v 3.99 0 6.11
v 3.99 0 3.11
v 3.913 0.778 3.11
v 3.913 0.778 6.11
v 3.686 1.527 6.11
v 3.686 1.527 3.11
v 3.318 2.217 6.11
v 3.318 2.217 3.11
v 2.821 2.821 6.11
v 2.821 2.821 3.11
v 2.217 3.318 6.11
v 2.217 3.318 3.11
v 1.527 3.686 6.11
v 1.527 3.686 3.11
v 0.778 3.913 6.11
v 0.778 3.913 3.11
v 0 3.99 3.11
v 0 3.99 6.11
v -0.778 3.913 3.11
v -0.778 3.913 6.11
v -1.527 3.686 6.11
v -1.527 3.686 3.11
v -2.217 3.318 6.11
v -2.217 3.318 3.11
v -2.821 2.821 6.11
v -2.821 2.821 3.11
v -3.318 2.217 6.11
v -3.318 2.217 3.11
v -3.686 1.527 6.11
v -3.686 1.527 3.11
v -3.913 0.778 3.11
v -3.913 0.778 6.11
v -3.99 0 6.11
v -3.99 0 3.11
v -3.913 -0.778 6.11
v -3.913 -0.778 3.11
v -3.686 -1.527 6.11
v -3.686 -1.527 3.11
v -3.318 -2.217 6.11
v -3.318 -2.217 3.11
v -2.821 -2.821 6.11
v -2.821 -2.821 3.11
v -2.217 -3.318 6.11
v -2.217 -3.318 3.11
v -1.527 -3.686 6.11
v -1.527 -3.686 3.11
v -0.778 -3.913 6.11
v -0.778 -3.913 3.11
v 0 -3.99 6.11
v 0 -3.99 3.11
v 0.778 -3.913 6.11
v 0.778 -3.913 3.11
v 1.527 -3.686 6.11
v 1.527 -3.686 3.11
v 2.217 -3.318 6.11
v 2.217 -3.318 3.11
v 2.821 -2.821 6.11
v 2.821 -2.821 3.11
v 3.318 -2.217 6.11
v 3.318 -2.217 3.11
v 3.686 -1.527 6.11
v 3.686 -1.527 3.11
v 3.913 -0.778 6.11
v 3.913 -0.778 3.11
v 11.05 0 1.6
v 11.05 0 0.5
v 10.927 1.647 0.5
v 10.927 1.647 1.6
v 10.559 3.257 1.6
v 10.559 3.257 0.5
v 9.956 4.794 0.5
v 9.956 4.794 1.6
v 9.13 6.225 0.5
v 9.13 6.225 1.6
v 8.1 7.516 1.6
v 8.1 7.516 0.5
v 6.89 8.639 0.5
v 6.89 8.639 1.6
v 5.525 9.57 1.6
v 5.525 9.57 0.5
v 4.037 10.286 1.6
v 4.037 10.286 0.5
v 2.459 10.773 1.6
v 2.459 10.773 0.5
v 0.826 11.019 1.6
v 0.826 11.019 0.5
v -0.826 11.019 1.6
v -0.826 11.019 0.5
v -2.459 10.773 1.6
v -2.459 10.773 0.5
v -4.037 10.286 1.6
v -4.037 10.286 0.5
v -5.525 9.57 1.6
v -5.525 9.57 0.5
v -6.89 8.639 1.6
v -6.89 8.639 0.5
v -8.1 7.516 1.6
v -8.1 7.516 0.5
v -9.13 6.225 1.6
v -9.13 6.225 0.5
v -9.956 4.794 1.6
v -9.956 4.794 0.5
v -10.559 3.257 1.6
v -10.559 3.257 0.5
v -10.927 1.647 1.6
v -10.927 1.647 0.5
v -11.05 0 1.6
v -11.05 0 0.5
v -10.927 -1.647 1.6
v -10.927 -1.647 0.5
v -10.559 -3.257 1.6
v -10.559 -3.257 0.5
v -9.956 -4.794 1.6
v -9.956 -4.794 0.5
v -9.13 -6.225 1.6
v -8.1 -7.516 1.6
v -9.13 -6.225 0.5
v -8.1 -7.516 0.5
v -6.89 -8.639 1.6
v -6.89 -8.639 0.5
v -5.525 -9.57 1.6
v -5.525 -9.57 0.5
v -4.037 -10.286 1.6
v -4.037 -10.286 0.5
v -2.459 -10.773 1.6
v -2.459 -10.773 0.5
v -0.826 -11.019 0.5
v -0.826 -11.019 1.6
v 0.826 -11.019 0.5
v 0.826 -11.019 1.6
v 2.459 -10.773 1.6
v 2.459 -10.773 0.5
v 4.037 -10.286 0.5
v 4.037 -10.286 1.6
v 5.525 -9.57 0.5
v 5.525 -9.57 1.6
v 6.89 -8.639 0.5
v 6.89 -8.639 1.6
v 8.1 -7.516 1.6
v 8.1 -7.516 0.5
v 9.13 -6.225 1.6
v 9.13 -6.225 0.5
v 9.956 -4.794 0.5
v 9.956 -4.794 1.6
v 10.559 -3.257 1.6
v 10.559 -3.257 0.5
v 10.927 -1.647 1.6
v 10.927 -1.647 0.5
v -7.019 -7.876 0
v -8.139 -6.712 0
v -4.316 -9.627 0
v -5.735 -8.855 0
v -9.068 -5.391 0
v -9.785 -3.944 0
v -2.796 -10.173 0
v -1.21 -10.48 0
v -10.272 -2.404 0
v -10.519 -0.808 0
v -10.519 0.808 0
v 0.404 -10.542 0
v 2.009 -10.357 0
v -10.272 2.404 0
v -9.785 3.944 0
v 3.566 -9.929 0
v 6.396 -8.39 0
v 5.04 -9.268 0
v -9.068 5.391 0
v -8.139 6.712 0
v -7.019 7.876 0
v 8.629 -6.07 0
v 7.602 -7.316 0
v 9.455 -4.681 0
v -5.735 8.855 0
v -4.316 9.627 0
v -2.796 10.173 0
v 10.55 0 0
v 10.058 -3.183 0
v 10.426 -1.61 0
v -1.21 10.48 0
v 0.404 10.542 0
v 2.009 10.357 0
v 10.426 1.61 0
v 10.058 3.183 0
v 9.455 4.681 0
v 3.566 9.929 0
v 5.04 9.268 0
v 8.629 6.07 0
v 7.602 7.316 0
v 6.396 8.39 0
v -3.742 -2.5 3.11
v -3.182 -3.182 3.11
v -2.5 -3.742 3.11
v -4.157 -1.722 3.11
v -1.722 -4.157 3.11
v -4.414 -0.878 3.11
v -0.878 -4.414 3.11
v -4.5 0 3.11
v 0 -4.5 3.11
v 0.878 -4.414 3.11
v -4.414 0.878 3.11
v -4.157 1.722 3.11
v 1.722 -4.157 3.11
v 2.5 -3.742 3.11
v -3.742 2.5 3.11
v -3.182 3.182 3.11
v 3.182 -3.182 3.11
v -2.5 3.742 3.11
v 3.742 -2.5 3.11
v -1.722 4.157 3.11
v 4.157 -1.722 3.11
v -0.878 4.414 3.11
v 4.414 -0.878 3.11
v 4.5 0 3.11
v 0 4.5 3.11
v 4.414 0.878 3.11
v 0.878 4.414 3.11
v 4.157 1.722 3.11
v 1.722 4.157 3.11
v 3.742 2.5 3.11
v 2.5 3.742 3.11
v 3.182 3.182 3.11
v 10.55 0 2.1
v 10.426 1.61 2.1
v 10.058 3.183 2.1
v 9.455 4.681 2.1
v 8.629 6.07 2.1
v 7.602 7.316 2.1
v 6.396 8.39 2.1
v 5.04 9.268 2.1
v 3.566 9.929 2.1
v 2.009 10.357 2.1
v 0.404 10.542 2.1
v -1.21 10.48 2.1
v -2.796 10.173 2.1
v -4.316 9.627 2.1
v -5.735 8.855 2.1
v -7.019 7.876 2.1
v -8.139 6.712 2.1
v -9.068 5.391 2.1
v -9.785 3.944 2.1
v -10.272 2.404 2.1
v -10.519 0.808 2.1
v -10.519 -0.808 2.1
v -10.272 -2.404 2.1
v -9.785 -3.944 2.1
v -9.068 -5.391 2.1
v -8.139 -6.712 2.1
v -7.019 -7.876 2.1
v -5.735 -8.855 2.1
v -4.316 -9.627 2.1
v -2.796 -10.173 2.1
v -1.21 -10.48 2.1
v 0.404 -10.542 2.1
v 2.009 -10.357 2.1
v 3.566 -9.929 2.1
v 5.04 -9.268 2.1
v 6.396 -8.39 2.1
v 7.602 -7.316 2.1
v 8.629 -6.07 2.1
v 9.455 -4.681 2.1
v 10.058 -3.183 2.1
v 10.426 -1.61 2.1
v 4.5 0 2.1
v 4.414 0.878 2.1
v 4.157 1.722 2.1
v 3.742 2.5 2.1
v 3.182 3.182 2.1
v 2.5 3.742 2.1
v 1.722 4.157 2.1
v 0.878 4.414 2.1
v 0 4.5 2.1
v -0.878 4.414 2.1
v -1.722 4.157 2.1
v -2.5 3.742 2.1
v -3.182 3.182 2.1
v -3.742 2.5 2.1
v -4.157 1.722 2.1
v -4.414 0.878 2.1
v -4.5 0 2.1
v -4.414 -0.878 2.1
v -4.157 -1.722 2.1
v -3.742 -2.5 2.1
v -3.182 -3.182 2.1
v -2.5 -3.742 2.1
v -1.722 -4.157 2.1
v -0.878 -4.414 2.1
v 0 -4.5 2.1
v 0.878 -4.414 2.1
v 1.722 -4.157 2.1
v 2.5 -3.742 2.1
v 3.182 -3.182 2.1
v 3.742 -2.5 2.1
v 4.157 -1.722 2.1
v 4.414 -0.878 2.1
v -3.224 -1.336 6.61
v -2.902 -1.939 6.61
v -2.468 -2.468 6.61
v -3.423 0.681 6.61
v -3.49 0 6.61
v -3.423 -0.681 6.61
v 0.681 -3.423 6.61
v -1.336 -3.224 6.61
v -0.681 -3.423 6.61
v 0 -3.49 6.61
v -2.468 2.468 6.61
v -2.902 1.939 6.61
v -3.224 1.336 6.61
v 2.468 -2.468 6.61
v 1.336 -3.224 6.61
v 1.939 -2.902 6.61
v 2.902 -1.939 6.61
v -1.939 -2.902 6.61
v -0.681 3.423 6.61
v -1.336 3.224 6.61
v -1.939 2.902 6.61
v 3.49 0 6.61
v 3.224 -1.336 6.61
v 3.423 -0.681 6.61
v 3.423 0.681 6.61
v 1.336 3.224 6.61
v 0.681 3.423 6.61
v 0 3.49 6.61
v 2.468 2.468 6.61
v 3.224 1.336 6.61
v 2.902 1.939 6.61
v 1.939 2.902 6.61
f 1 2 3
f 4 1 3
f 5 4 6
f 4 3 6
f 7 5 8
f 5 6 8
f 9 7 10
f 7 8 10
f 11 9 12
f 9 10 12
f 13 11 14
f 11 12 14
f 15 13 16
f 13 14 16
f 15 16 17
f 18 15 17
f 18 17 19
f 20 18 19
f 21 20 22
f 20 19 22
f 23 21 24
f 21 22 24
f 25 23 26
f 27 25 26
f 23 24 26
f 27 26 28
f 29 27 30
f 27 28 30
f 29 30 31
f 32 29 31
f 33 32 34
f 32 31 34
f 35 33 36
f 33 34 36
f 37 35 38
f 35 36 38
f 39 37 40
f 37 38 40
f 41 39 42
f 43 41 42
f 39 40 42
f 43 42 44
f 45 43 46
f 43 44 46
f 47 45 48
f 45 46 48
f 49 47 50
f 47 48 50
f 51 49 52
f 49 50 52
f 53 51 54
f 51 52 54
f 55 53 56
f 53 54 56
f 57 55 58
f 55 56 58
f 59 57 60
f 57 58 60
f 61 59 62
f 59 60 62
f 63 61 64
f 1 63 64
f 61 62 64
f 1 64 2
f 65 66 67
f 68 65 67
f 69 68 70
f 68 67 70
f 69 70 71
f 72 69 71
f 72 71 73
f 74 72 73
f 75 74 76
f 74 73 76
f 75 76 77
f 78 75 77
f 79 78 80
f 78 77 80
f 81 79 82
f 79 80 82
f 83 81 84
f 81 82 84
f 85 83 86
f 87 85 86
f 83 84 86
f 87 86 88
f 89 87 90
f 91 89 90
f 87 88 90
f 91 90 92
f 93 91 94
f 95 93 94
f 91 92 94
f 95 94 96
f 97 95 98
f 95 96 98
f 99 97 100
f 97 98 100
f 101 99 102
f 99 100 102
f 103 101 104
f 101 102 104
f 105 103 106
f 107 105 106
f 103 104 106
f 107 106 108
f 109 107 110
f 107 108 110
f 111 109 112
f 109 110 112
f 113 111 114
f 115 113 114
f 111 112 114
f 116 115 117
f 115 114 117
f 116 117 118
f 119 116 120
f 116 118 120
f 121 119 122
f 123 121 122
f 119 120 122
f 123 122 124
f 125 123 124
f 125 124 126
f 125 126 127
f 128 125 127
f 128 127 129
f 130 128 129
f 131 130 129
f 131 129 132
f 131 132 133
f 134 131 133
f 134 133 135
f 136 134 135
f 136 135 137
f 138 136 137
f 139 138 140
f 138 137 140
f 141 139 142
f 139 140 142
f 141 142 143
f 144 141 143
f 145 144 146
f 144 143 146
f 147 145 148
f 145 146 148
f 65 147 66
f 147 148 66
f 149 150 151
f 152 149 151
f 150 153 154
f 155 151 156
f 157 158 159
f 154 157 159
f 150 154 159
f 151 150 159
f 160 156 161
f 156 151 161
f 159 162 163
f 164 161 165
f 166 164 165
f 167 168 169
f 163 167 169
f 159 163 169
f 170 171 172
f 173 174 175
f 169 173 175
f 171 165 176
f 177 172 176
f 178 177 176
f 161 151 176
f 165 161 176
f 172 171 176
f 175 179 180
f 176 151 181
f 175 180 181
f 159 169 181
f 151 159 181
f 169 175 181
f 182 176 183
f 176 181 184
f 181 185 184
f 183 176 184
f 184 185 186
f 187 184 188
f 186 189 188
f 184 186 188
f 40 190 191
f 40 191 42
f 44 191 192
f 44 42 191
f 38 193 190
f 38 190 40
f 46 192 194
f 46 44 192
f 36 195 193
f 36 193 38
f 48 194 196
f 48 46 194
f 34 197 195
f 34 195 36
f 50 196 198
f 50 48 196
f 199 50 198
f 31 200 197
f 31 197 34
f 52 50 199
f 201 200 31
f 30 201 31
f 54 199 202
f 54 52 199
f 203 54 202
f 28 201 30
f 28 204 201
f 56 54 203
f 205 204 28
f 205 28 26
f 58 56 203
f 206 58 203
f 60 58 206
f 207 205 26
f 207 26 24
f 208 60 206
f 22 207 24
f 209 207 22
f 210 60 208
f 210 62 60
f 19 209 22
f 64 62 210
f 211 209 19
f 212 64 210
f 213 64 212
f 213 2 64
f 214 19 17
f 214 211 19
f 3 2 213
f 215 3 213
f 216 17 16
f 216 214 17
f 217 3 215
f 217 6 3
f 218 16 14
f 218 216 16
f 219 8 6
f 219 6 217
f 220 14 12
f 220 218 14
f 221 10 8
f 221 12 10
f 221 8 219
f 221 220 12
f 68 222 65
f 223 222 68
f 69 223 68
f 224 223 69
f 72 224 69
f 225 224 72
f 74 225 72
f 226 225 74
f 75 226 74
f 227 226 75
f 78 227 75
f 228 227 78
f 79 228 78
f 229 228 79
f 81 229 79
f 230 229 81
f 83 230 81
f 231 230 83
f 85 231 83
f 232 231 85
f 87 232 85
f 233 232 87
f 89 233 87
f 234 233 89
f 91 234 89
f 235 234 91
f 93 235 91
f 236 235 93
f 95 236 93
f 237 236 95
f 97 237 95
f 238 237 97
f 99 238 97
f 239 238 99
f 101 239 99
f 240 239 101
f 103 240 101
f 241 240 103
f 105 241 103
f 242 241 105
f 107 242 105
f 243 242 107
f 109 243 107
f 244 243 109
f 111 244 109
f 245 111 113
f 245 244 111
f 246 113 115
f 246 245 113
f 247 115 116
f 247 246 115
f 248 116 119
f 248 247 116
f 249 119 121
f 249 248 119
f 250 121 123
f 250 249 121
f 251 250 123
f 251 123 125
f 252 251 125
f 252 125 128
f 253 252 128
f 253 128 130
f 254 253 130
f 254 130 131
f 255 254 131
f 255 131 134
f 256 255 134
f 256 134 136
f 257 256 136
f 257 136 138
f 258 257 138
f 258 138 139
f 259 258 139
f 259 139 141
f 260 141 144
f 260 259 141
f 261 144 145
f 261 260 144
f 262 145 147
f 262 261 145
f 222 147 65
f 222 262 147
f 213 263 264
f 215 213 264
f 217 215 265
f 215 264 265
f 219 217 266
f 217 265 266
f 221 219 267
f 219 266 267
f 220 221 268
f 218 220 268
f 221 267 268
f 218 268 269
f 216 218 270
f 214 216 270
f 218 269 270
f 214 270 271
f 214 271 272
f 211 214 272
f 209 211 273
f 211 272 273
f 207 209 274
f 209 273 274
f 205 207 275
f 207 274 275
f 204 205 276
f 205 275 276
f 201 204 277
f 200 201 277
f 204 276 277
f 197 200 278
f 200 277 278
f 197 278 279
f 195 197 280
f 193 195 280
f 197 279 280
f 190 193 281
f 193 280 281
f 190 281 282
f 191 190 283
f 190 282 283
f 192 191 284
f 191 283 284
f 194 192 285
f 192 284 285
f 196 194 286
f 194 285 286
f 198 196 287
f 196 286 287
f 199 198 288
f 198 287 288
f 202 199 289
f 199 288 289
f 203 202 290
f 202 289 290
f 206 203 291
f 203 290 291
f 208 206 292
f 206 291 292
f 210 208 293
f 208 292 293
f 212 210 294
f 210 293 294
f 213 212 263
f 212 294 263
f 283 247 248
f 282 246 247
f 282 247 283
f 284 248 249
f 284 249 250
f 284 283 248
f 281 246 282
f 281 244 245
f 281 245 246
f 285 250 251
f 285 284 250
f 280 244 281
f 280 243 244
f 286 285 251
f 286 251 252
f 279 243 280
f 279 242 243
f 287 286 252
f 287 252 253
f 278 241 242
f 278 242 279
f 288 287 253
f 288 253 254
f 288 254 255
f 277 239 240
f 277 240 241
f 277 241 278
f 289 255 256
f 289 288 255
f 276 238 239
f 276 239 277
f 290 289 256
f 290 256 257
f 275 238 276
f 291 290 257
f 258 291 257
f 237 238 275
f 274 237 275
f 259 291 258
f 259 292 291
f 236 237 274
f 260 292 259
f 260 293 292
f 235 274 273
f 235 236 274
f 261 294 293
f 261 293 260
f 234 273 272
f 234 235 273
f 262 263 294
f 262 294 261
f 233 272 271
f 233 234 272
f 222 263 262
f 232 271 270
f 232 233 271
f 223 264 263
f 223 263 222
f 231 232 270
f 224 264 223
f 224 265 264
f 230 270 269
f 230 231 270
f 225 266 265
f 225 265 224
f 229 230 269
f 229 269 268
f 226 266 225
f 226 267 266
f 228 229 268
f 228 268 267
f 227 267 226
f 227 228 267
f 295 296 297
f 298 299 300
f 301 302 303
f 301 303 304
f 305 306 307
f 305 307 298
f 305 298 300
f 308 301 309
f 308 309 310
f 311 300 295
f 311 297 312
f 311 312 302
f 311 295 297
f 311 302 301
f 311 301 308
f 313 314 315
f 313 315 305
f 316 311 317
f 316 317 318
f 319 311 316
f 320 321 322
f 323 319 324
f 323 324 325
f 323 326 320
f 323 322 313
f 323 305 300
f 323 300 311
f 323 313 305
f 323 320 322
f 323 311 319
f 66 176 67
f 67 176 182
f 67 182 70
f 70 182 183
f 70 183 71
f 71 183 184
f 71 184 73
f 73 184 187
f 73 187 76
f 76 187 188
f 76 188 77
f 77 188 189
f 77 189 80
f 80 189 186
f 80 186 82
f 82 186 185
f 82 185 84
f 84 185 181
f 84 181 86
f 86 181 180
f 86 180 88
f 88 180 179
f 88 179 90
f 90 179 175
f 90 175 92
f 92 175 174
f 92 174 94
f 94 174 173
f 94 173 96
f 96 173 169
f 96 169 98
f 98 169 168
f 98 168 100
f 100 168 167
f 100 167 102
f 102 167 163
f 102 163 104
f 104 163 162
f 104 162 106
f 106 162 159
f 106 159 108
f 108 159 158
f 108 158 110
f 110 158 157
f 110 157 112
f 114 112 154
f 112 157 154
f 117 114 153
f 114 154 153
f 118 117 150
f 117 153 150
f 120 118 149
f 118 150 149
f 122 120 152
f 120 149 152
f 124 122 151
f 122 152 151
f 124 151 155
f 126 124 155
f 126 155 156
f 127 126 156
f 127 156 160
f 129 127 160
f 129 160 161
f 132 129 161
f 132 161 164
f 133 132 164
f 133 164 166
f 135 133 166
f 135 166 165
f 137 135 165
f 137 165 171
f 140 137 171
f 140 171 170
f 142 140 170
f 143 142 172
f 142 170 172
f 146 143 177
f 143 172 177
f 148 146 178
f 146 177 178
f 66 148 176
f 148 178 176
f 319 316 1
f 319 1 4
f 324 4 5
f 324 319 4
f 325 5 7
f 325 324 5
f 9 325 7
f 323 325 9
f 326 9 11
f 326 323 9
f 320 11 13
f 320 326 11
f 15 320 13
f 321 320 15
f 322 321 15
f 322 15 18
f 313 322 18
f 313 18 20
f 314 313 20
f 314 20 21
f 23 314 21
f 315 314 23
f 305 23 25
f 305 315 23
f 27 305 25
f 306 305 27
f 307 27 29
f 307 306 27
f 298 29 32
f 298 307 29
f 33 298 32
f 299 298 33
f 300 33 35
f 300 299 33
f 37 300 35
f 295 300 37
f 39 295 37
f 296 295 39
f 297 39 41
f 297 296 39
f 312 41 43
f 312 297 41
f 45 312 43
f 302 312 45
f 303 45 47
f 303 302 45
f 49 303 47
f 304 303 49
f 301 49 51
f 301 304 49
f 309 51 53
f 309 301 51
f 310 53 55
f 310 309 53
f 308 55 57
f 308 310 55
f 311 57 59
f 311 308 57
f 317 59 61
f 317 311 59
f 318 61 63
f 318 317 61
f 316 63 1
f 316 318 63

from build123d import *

# Parameters (mm, degrees)
F0_R     = 11.05
F1_DEPTH = 2.1
F2_R     = 4.5
F3_DEPTH = 1.01
F4_R     = 3.99
F5_DEPTH = 3.5
F6_SIZE  = 0.5


with BuildPart() as f1:
    # F0 (on Top) → F1 (new body)
    with BuildSketch(Plane.XY):
        Circle(F0_R)
    extrude(amount=F1_DEPTH)

    # F2 (on face) → F3 (join)
    with BuildSketch(Plane.XY.offset(2.1)):
        Circle(F2_R)
    extrude(amount=F3_DEPTH)

    # F4 (on face) → F5 (join)
    with BuildSketch(Plane.XY.offset(3.11)):
        Circle(F4_R)
    extrude(amount=F5_DEPTH)

    # F6
    f6_edges = [f1.edges().sort_by_distance(p)[0] for p in [
        (-11.05, 0, 2.1),
        (-3.99, 0, 6.61),
        (-11.05, 0, 0),
    ]]
    chamfer(f6_edges, length=F6_SIZE)


solid = f1.part
